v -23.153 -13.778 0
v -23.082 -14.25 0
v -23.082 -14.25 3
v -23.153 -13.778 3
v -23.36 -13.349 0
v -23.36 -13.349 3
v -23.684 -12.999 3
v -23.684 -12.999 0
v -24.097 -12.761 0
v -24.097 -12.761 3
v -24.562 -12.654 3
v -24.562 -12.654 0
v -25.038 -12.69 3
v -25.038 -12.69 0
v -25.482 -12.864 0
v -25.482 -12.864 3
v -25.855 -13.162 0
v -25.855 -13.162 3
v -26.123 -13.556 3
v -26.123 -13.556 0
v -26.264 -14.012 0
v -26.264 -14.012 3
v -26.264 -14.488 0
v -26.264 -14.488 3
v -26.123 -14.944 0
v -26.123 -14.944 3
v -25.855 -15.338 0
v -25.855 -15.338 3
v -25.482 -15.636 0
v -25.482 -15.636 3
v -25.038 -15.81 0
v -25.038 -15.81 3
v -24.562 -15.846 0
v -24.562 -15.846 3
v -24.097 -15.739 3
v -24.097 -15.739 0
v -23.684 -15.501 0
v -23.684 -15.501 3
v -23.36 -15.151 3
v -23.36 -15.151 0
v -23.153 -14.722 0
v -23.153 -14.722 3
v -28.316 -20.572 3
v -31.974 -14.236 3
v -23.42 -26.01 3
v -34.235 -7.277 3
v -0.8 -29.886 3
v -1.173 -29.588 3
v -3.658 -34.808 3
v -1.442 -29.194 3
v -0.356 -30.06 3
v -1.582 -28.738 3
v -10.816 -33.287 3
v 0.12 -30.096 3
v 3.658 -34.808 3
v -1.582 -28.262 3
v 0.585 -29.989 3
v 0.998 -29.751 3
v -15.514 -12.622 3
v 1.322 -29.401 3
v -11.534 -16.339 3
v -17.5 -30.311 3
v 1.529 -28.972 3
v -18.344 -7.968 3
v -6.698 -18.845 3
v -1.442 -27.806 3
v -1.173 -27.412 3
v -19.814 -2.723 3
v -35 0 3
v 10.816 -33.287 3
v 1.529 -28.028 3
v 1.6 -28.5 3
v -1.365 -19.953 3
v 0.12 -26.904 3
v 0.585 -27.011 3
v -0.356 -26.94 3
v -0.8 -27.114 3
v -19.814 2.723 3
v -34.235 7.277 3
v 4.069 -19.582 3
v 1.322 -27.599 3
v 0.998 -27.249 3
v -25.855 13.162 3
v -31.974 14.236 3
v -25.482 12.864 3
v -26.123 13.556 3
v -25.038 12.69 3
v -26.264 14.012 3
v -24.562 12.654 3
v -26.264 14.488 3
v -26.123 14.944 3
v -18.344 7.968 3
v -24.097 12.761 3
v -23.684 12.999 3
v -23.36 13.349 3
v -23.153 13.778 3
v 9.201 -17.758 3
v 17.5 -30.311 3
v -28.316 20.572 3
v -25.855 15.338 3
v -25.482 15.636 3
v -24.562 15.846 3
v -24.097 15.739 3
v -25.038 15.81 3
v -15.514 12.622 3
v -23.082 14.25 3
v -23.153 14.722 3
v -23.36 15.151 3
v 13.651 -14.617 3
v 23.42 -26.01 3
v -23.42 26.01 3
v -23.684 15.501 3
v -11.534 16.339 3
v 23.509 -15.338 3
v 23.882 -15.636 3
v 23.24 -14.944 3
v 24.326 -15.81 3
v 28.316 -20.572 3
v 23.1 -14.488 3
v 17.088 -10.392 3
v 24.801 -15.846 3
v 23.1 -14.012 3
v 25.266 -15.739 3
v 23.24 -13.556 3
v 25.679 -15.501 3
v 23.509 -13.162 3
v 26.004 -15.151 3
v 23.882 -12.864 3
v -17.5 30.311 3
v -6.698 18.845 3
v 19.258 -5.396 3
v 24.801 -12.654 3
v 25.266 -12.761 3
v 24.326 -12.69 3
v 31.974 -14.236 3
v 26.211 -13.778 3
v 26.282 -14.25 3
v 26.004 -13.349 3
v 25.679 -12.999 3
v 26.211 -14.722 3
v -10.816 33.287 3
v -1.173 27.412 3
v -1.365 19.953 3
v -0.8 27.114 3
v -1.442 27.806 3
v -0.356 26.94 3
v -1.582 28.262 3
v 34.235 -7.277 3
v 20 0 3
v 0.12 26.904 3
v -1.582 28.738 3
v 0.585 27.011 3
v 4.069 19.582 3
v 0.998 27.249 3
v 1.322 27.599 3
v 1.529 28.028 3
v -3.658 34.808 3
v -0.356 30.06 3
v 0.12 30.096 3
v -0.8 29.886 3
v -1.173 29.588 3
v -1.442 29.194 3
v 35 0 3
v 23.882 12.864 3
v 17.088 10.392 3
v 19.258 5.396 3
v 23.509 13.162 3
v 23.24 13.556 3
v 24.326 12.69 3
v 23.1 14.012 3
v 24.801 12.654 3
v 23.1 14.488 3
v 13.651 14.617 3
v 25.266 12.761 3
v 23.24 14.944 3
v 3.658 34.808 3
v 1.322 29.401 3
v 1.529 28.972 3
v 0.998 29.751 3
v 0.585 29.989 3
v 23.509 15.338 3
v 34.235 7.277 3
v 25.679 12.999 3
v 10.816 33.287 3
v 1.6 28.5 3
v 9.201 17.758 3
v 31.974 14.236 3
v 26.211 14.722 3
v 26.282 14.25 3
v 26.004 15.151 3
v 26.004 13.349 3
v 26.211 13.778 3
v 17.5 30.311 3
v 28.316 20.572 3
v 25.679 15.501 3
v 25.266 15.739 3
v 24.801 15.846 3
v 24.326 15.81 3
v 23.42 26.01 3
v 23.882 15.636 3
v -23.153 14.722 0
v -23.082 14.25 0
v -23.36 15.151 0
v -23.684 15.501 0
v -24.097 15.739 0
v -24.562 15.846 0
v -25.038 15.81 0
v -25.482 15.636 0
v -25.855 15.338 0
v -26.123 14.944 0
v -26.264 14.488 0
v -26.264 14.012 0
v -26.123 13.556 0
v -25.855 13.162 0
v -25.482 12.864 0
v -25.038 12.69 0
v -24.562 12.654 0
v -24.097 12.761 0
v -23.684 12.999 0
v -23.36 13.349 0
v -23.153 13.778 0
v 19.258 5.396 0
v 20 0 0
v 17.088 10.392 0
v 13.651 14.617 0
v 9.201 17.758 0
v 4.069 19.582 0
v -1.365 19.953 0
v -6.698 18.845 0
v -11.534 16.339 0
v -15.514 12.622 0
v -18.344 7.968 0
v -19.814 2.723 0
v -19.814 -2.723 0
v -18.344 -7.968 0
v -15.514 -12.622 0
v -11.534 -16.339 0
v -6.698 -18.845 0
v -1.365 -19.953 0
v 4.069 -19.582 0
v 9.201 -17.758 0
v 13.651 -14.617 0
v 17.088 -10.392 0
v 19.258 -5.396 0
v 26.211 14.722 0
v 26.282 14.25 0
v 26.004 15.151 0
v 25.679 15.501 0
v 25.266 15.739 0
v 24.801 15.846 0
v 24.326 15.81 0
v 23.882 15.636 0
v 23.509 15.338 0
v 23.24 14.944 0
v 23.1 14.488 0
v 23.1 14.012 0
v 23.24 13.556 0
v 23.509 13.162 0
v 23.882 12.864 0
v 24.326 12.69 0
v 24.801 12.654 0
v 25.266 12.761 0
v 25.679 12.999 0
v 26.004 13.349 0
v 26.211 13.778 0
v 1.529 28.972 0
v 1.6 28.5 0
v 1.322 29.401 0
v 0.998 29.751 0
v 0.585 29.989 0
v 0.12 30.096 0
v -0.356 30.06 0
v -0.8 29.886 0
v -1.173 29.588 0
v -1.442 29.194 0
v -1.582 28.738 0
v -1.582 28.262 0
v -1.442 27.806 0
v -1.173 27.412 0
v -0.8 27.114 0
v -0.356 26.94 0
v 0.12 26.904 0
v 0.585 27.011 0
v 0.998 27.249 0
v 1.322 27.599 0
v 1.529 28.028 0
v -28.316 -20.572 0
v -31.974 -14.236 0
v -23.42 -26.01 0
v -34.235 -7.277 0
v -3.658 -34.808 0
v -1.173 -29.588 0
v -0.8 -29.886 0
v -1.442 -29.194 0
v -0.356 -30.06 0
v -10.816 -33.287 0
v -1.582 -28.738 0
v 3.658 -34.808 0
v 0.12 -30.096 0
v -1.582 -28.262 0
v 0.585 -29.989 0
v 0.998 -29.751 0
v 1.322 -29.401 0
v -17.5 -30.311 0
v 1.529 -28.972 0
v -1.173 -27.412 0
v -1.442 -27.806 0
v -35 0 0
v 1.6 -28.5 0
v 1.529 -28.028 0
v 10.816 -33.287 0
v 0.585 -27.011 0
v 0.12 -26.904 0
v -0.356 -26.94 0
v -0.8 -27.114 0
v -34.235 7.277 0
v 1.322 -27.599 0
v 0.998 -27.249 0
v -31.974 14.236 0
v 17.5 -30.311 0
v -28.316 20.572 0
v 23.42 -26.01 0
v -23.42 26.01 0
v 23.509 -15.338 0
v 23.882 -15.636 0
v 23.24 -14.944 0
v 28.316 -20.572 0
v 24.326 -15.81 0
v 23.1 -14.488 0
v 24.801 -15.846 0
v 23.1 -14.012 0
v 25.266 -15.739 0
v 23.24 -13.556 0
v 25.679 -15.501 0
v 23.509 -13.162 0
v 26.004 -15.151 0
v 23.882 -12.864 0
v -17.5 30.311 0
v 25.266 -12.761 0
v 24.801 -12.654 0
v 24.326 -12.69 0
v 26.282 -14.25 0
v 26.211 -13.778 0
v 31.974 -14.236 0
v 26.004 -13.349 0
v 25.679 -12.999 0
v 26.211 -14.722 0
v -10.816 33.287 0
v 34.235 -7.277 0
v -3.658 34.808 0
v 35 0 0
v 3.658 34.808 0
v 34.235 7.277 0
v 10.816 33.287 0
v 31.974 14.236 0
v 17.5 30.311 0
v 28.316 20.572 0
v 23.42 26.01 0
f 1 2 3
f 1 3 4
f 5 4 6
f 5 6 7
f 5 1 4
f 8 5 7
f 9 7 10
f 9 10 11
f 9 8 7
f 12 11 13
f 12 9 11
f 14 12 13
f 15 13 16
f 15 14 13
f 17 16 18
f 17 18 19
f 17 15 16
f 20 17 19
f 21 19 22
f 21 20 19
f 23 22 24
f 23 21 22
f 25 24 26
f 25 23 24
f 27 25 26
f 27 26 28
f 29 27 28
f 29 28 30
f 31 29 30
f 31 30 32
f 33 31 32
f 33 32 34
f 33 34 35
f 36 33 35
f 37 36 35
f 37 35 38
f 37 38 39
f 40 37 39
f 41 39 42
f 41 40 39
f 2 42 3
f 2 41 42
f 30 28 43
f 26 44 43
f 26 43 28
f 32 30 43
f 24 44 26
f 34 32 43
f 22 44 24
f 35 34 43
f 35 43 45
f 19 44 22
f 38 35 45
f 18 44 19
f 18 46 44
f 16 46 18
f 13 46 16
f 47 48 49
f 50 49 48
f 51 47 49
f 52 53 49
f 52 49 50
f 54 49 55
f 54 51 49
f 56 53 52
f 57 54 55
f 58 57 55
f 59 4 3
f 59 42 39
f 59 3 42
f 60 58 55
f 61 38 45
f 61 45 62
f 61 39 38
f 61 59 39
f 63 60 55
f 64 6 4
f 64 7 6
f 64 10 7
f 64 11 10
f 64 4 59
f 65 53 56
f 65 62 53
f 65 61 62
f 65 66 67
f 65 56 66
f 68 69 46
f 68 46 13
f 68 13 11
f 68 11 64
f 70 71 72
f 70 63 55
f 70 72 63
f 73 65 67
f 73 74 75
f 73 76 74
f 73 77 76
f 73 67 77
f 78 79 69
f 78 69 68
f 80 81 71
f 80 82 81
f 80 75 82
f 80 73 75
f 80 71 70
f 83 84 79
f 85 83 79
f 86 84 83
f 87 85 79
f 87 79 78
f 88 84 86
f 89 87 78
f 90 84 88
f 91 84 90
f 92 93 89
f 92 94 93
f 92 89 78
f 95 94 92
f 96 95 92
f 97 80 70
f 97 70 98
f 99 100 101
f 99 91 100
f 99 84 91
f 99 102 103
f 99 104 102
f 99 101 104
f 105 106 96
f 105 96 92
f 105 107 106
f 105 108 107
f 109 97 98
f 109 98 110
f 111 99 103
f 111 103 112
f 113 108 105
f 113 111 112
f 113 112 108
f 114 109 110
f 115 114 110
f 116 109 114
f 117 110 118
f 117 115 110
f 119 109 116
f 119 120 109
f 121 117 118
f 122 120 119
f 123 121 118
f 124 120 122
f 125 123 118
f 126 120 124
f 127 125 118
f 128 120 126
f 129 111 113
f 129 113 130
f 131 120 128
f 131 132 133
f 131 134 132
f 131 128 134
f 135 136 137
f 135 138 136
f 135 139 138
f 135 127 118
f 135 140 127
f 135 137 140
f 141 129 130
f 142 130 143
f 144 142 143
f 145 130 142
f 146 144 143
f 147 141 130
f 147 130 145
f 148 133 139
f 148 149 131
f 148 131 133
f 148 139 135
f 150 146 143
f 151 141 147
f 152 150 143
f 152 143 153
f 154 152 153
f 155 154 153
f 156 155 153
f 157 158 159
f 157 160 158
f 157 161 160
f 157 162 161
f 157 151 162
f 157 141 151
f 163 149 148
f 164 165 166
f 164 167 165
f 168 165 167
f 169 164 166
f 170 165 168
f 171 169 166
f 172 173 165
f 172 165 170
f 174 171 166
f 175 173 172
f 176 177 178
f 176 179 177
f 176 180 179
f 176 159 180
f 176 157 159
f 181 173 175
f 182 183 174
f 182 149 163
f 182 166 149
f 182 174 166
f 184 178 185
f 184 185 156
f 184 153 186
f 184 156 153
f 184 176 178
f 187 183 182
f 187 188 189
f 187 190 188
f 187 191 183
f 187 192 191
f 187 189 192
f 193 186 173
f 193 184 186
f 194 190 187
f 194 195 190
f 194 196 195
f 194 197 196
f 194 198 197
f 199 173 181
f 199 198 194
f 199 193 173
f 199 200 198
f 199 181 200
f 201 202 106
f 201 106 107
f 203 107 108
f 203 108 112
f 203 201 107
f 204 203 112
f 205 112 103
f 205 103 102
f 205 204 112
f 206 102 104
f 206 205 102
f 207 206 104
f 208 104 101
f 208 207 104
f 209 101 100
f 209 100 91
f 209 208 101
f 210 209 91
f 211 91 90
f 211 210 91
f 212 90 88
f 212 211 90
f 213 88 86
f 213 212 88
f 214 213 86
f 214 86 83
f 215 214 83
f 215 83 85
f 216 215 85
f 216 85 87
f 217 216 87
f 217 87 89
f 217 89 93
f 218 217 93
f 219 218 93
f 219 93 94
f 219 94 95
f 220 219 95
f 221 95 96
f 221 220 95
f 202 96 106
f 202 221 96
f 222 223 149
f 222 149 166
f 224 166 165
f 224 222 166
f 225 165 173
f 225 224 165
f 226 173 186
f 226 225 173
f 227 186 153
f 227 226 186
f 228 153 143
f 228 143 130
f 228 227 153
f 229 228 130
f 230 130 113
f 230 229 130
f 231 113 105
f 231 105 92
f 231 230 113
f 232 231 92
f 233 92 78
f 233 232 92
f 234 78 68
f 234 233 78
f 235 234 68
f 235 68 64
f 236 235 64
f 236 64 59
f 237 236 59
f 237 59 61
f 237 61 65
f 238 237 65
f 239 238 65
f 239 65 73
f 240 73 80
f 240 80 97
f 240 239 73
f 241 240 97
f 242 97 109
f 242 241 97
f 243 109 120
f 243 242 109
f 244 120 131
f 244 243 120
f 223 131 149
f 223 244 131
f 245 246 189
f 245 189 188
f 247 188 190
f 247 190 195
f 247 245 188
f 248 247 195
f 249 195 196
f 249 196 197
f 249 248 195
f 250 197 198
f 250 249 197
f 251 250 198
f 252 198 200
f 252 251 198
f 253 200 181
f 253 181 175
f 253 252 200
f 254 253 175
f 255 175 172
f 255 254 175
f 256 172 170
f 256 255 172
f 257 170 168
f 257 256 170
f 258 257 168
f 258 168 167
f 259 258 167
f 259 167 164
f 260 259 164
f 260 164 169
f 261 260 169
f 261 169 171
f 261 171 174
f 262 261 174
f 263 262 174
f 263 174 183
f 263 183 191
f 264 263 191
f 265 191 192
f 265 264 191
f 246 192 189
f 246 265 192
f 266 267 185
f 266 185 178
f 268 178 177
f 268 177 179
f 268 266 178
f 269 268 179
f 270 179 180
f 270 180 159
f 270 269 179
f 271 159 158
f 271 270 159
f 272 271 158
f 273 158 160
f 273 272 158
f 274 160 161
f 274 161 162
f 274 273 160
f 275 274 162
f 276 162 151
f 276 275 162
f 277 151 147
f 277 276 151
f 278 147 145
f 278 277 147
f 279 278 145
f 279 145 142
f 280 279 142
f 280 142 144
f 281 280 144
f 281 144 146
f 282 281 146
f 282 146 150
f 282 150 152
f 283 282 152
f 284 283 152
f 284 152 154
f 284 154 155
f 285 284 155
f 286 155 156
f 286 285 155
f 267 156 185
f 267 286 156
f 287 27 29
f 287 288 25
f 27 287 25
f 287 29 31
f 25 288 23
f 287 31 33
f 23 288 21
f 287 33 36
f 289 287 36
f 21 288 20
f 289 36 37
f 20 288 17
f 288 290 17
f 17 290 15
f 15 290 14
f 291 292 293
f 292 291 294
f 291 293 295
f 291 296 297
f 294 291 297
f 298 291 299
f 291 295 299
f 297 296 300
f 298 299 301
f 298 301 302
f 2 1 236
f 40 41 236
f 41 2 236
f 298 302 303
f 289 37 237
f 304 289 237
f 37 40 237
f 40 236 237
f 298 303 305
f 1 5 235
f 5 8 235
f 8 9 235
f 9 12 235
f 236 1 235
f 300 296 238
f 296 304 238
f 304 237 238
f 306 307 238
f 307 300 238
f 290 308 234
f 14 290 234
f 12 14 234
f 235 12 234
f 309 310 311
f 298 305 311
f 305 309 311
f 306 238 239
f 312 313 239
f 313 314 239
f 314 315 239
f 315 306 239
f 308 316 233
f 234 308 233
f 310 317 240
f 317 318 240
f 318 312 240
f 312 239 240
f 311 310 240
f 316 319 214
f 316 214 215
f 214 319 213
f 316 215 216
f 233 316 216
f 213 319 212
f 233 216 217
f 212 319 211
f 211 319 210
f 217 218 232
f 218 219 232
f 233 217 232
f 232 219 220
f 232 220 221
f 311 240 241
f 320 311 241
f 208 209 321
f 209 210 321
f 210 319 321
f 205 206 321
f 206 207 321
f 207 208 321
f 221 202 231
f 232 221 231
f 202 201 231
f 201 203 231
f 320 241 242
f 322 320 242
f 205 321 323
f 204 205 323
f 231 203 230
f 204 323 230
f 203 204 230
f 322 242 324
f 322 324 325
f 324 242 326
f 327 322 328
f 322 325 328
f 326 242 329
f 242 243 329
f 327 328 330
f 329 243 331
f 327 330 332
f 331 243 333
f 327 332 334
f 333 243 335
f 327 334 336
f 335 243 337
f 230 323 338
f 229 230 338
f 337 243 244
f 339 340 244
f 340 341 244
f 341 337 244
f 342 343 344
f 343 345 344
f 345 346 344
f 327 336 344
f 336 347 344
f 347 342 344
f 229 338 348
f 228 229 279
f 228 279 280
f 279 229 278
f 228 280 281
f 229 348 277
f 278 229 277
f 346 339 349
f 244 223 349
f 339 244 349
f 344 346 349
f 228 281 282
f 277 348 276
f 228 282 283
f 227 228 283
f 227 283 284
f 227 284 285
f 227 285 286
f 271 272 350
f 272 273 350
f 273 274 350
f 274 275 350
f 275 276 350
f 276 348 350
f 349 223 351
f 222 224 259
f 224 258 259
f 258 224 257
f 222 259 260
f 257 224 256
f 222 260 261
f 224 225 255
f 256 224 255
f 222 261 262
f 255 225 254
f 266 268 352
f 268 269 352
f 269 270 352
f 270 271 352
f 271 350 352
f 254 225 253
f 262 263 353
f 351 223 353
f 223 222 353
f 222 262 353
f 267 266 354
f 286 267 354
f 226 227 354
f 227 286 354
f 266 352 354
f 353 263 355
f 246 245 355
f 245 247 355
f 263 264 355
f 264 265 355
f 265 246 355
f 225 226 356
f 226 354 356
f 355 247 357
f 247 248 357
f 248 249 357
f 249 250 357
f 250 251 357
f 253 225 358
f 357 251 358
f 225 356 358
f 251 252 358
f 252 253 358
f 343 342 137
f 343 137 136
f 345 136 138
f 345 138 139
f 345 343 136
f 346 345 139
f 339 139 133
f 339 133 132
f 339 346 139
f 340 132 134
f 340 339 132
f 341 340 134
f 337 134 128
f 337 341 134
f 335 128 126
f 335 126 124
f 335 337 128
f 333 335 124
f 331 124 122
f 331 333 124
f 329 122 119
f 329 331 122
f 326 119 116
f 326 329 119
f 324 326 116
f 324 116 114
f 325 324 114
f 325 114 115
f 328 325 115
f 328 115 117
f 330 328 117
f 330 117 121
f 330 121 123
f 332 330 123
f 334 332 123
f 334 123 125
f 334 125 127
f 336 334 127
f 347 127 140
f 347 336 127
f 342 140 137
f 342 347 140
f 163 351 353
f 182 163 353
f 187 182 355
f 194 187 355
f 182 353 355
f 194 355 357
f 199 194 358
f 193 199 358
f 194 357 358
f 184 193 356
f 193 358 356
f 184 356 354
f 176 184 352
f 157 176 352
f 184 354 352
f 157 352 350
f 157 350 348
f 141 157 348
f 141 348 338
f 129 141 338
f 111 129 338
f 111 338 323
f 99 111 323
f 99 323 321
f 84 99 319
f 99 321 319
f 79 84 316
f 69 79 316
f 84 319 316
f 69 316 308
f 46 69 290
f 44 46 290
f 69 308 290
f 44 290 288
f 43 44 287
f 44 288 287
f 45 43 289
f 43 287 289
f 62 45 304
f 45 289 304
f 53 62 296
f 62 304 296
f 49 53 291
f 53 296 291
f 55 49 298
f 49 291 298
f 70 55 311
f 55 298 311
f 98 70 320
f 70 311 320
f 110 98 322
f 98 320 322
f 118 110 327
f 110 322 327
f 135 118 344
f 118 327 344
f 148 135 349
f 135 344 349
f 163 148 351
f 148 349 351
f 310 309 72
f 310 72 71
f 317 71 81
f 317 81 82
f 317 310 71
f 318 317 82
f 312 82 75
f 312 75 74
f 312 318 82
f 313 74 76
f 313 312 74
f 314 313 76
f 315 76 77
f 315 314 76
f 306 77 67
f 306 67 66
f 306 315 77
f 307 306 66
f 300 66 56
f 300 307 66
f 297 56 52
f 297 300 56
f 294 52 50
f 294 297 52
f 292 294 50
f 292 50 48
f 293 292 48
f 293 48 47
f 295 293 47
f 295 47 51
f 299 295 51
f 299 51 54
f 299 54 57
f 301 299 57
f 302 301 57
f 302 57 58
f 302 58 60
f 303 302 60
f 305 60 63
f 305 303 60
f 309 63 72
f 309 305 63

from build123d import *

# Parameters (mm, degrees)
F0_R     = 22.5
F0_R_2   = 20
F1_DEPTH = 3
F0_R_3   = 35
F0_R_4   = 1.6
F2_DEPTH = 3


with BuildPart() as f1:
    # F0 (on Top) → F1 (new body)
    with BuildSketch(Plane.XY):
        Circle(F0_R)
        Circle(F0_R_2, mode=Mode.SUBTRACT)
    extrude(amount=F1_DEPTH)

    # F0 (on Top) → F2 (join)
    with BuildSketch(Plane.XY):
        Circle(F0_R_3)
        with Locations((-24.681724, -14.25)):
            Circle(F0_R_4, mode=Mode.SUBTRACT)
        with Locations((0, -28.5)):
            Circle(F0_R_4, mode=Mode.SUBTRACT)
        with Locations((24.681724, -14.25)):
            Circle(F0_R_4, mode=Mode.SUBTRACT)
        with Locations((-24.681724, 14.25)):
            Circle(F0_R_4, mode=Mode.SUBTRACT)
        Circle(F0_R, mode=Mode.SUBTRACT)
        with Locations((24.681724, 14.25)):
            Circle(F0_R_4, mode=Mode.SUBTRACT)
        with Locations((0, 28.5)):
            Circle(F0_R_4, mode=Mode.SUBTRACT)
    extrude(amount=F2_DEPTH)


solid = f1.part
